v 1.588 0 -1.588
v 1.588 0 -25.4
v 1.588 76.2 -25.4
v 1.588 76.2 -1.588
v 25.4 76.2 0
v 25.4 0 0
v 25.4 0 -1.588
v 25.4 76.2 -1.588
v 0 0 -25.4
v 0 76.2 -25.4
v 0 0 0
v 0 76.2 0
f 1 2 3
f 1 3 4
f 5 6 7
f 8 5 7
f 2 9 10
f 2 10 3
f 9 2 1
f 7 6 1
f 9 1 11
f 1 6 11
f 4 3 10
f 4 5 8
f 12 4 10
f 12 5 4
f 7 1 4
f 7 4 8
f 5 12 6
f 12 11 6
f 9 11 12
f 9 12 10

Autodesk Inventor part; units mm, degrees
ref_plane "YZ Plane" through (0, 0, 0) normal (1, 0, 0) x (0, 1, 0)
ref_plane "XZ Plane" through (0, 0, 0) normal (0, 1, 0) x (-1, 0, 0)
ref_plane "XY Plane" through (0, 0, 0) normal (0, 0, 1) x (1, 0, 0)
sketch "Sketch1" plane through (0, 0, 0) normal (0, 1, 0) x (-1, 0, 0)
  line L0 (0, 0) -> (0, -25.4)
  line L1 (0, 0) -> (-25.4, 0)
  line L2 (-1.5875, -25.4) -> (-1.5875, -1.5875)
  line L3 (-1.5875, -1.5875) -> (-25.4, -1.5875)
  line L4 (0, -25.4) -> (-1.5875, -25.4)
  line L5 (-25.4, 0) -> (-25.4, -1.5875)
  point P0 (0, -12.7)
  dimension "d1" = 25.4
  dimension "d2" = 25.4
  dimension "d3" = 1.5875
extrude "Extrusion1" add sketch "Sketch1" along normal blind 76.2
properties part number "gripper limiter brackets"
